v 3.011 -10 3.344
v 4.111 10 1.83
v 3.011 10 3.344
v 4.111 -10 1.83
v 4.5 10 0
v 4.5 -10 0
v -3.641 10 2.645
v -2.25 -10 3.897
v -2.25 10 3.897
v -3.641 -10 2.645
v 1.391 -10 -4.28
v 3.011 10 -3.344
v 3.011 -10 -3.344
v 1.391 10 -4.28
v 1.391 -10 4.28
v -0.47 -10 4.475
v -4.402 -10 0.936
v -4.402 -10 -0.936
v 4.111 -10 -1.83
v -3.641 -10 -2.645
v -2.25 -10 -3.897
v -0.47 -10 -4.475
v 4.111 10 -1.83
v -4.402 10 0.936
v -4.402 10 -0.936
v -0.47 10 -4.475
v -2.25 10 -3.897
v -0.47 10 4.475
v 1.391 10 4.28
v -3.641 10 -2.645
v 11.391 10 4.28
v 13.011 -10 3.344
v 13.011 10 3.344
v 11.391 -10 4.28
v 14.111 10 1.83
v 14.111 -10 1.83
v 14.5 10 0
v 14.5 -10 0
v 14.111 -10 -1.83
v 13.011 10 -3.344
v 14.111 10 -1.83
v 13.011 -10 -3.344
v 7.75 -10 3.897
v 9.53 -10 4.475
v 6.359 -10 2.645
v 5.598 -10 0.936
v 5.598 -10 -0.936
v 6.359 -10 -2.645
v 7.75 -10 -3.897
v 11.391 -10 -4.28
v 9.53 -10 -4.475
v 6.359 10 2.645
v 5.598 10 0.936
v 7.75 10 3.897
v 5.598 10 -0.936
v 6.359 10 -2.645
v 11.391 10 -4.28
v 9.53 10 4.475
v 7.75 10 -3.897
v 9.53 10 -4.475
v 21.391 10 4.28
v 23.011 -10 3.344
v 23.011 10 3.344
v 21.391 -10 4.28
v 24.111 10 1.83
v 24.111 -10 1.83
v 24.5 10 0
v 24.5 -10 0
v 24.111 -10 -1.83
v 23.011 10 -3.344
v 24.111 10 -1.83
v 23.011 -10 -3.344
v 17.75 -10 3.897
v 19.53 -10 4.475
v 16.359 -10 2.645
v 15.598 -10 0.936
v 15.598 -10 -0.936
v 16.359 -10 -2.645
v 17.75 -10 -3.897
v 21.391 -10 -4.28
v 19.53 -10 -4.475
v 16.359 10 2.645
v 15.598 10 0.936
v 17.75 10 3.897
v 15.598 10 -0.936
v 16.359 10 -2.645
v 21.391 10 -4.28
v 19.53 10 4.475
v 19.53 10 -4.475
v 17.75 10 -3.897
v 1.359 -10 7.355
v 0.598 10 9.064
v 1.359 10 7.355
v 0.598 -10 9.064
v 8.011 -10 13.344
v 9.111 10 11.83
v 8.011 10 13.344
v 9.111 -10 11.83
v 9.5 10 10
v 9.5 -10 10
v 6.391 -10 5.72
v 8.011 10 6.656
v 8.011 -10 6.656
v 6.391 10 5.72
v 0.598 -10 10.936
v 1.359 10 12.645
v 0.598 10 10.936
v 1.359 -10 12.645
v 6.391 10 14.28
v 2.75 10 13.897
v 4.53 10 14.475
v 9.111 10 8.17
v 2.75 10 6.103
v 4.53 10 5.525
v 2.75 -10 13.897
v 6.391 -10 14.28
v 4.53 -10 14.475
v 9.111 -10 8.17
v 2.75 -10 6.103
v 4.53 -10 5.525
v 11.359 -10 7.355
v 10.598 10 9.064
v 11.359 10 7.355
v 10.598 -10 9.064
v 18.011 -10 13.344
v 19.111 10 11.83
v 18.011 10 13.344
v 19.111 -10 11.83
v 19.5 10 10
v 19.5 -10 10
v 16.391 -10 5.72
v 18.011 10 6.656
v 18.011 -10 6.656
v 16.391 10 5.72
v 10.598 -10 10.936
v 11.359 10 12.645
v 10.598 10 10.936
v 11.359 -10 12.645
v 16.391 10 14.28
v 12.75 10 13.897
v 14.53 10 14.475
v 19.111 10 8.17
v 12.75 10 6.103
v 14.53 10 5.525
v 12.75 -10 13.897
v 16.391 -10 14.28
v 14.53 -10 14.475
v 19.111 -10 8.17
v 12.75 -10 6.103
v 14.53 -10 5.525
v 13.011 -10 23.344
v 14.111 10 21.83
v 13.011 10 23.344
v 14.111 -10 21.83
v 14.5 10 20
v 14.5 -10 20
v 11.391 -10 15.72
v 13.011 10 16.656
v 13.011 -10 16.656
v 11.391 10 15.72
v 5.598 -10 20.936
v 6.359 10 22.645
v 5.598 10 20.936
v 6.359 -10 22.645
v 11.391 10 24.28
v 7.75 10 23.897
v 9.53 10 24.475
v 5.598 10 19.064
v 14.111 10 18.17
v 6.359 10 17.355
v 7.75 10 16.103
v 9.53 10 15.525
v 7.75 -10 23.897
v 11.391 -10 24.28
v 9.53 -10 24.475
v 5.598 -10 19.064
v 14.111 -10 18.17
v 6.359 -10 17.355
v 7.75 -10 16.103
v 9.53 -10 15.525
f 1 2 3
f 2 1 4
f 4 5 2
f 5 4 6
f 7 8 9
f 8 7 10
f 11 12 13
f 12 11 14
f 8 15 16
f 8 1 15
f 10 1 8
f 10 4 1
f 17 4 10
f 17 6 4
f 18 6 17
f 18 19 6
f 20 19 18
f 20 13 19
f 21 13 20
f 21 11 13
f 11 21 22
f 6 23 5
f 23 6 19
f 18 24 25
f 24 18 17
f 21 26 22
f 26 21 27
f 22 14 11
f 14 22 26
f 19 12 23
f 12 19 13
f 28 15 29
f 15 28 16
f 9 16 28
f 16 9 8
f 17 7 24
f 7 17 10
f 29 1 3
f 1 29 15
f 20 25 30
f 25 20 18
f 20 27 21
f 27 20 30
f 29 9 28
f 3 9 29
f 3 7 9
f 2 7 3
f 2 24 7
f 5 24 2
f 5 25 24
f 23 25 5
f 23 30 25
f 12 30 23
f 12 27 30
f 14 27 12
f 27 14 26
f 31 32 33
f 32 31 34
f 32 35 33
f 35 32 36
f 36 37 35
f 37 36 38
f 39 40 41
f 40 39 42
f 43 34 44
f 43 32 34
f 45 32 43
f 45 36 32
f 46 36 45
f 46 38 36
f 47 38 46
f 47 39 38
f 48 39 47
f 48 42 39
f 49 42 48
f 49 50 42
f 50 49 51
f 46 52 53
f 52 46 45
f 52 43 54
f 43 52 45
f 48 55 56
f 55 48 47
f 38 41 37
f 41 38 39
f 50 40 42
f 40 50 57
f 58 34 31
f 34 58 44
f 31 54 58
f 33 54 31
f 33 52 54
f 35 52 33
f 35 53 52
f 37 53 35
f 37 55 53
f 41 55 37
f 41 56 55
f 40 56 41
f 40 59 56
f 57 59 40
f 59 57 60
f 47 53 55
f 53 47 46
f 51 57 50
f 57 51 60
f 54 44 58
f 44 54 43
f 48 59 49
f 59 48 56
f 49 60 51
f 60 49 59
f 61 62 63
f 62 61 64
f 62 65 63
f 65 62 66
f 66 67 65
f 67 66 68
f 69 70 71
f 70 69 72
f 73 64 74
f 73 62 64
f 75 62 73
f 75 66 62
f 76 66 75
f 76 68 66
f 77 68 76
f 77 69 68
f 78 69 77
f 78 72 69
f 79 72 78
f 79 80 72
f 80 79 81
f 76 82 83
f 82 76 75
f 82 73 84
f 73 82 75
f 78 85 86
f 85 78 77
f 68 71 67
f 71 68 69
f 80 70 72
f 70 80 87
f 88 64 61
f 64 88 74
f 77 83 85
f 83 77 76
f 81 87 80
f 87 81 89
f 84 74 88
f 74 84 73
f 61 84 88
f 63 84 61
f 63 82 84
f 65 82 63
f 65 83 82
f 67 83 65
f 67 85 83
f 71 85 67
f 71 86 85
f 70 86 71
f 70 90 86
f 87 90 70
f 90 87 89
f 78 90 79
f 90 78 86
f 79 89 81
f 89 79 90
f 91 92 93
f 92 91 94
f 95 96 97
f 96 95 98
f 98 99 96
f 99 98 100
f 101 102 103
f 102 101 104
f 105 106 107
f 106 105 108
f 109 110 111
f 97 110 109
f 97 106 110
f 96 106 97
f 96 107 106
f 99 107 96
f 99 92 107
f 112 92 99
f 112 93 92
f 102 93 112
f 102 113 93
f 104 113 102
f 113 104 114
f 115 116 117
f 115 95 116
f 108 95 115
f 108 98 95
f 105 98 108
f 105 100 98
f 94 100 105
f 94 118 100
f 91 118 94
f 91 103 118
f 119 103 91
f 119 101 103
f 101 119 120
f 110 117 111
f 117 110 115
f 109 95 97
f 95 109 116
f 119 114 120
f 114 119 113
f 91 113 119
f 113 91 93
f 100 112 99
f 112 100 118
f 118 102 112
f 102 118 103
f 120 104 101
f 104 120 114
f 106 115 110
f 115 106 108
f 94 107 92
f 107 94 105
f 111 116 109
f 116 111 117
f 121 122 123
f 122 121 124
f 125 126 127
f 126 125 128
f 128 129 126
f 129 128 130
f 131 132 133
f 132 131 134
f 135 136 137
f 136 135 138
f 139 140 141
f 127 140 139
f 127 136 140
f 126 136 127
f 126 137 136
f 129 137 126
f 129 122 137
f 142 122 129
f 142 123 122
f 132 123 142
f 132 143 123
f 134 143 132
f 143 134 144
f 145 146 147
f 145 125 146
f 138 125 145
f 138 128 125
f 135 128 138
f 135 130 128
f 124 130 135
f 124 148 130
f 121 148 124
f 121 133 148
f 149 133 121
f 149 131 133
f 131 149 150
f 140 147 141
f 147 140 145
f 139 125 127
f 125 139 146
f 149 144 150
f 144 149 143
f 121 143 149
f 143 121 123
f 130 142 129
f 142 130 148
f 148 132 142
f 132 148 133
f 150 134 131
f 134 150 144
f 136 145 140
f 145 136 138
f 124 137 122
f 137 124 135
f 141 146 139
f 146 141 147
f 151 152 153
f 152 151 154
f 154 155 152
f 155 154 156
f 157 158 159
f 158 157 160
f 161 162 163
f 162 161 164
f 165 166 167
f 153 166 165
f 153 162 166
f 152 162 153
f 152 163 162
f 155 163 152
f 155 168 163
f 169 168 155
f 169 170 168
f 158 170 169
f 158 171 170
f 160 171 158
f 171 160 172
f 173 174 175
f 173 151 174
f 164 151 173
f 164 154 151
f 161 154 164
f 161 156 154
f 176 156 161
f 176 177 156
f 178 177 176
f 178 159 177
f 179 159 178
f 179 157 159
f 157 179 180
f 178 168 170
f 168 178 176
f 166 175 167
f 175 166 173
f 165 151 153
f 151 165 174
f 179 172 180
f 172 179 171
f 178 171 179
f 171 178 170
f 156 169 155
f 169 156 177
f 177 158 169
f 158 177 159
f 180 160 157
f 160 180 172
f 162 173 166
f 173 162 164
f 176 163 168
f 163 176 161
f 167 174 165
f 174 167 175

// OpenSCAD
// The following is an example of a for loop using nested vectors to position
// each of the cylinders.
for (i = [[0, 0, 0], [10, 0, 0], [20, 0, 0],
        [5, 0, 10,], [15, 0, 10],
        [10, 0, 20]]) {
    translate(i) {
        rotate([90, 0, 0])
            cylinder(h = 20, r = 4.5, center = true);
    }
}
